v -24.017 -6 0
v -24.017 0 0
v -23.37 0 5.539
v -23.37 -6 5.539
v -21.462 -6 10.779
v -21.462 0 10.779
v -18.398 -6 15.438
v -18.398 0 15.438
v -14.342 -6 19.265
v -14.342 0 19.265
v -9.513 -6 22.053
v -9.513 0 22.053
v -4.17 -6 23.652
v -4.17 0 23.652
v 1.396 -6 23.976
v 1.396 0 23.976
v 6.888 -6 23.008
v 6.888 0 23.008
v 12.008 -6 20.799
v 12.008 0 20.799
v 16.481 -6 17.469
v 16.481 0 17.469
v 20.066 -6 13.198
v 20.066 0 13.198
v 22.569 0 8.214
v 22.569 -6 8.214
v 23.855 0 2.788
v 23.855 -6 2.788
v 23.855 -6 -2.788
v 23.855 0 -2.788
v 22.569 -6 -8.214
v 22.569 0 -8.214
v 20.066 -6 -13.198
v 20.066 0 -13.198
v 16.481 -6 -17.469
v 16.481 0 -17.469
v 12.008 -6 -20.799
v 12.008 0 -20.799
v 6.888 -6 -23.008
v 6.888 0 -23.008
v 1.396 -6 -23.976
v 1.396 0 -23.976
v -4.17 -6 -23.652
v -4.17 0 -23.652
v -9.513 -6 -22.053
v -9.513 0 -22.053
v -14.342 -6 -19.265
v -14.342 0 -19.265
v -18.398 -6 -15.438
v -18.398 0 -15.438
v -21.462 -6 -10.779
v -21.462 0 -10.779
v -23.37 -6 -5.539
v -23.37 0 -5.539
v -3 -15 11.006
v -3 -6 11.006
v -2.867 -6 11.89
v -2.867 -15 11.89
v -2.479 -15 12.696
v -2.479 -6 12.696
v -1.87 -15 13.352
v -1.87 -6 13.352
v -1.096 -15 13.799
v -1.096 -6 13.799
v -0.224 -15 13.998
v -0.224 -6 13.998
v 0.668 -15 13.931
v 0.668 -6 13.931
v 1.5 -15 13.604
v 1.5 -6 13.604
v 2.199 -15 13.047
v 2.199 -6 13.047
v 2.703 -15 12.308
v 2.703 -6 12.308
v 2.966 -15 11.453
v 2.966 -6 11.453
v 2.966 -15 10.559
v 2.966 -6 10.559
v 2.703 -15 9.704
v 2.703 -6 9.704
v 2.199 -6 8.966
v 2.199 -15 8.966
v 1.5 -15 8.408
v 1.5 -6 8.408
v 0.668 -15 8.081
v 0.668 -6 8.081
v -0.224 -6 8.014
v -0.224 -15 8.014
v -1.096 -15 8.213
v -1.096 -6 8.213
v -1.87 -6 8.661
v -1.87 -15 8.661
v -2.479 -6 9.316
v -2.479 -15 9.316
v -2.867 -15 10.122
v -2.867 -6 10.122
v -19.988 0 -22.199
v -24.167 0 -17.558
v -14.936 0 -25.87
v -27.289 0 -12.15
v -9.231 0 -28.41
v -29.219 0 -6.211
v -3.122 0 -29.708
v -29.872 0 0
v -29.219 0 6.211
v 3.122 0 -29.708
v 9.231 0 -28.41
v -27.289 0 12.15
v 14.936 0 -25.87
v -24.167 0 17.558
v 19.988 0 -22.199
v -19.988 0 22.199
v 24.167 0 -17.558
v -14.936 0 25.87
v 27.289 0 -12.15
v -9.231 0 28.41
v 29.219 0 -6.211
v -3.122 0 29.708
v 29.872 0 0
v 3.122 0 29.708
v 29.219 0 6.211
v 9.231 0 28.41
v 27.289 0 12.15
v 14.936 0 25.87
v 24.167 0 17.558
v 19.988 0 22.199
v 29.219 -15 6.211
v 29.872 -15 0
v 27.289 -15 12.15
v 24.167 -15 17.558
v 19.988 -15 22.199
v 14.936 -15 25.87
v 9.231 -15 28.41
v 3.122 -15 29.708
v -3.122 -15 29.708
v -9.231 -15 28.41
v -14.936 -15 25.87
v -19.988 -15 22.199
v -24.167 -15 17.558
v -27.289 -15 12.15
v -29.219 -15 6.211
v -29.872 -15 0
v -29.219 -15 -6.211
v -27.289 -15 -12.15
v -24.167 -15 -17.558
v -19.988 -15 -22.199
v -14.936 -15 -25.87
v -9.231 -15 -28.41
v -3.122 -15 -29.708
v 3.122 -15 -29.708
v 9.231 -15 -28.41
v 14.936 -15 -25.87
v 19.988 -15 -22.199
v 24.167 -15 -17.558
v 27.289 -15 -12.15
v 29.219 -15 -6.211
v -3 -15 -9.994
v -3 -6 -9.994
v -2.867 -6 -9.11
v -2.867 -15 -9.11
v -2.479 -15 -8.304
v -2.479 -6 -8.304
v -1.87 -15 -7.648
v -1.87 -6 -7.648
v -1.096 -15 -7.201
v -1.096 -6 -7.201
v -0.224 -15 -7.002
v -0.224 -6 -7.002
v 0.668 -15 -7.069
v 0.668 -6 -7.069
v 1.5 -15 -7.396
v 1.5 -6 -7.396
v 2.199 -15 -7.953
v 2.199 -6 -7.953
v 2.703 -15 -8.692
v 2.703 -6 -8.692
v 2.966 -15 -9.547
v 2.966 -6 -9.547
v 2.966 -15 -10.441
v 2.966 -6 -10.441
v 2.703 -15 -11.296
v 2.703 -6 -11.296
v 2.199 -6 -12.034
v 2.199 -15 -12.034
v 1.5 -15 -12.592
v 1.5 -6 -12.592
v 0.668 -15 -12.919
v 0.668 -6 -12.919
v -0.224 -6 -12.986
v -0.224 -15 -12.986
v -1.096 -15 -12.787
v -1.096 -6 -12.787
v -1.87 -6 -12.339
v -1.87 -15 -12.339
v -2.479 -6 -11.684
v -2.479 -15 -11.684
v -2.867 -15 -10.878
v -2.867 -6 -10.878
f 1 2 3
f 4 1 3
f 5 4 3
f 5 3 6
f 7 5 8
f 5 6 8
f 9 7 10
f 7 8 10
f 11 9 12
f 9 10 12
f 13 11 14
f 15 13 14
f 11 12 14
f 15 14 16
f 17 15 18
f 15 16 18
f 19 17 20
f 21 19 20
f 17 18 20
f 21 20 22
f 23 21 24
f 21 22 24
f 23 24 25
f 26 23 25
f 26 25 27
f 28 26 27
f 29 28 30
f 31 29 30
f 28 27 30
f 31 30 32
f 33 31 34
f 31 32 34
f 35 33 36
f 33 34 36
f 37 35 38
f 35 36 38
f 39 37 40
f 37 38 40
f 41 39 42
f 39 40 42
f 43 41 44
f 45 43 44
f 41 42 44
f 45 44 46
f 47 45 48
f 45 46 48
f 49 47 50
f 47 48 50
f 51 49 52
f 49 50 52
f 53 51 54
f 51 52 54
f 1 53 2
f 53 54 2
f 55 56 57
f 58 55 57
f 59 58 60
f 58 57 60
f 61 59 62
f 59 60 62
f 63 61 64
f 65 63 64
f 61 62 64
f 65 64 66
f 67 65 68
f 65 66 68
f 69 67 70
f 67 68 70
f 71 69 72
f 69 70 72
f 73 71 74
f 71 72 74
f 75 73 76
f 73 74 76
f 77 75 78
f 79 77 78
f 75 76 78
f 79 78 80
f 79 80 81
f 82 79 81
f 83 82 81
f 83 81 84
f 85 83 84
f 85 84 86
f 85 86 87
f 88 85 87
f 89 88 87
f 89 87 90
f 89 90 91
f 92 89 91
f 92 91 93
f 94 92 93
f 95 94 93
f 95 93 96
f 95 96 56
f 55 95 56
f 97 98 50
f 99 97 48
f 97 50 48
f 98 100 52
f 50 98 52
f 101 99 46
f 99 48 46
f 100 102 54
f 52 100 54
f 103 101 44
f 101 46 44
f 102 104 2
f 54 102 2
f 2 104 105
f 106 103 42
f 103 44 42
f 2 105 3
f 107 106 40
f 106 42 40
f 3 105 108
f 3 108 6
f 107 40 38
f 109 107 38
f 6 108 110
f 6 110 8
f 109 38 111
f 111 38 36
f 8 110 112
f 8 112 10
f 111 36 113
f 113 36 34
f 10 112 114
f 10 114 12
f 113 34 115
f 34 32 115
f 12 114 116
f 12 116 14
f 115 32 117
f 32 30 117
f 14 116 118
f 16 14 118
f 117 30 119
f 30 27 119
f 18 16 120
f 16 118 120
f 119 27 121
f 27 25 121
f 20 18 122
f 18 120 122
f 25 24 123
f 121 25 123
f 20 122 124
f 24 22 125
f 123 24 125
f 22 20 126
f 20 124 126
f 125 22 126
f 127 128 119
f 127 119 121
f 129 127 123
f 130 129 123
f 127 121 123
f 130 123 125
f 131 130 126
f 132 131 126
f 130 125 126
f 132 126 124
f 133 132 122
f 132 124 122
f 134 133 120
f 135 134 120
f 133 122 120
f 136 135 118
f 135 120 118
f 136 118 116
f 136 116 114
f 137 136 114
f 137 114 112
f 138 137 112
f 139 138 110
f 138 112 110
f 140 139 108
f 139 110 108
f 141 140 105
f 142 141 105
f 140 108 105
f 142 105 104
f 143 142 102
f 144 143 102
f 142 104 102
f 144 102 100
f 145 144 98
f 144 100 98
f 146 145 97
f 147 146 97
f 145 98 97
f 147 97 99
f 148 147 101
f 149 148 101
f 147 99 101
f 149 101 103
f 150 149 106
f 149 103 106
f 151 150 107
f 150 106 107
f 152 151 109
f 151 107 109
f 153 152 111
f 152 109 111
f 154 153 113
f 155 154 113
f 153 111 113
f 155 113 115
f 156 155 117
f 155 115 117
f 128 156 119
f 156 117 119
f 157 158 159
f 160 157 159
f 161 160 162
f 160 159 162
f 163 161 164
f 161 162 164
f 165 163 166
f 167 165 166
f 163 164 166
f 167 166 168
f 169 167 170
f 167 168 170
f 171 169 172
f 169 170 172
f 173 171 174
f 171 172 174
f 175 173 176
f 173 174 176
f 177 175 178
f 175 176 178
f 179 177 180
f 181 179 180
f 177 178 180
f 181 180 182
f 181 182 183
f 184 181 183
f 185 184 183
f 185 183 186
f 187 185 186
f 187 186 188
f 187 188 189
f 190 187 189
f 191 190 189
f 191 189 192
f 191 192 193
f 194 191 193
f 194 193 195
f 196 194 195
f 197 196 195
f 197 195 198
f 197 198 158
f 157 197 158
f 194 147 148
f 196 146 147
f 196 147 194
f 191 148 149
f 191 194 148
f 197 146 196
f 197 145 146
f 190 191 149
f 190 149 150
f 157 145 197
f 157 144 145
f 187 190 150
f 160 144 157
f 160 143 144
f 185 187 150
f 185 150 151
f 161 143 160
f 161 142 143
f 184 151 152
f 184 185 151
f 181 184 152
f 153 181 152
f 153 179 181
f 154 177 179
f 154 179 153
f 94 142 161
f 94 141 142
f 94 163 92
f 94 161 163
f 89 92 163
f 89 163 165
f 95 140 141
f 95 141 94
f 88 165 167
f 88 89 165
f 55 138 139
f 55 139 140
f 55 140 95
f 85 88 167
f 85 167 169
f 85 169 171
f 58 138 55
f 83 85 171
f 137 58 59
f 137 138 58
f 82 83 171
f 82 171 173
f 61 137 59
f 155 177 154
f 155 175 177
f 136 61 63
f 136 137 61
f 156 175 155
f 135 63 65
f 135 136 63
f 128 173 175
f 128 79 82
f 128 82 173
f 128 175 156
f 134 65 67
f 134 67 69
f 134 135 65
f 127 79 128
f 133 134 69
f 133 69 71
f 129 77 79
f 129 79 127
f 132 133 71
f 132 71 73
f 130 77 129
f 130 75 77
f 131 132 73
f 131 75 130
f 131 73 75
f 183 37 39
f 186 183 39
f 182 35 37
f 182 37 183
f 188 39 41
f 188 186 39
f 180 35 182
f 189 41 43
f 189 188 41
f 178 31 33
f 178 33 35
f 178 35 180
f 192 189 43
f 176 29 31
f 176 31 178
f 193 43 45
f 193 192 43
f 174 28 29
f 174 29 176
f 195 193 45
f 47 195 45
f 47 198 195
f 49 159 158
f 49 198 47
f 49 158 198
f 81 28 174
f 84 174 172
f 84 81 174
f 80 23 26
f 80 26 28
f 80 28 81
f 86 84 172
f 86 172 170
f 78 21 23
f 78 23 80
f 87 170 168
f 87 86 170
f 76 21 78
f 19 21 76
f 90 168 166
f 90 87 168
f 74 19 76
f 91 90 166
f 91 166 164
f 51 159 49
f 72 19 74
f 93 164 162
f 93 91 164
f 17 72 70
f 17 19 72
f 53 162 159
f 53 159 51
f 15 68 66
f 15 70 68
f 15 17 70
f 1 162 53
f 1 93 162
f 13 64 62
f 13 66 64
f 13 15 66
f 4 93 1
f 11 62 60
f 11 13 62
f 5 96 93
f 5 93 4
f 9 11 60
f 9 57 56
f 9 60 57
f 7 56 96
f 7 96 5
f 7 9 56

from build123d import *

# Parameters (mm, degrees)
F0_R     = 29.871853
F1_DEPTH = 15
F2_R     = 24.016909
F3_DEPTH = 6
F4_R     = 3
F5_DEPTH = 25


with BuildPart() as f1:
    # F0 (on Front) → F1 (new body)
    with BuildSketch(Plane.XZ):
        Circle(F0_R)
    extrude(amount=F1_DEPTH)

    # F2 (on face) → F3 (cut)
    with BuildSketch(Plane(origin=(0, 0, 0), x_dir=(-1, 0, 0), z_dir=(0, 1, 0))):
        Circle(F2_R)
    extrude(amount=-F3_DEPTH, mode=Mode.SUBTRACT)

    # F4 (on face) → F5 (cut)
    with BuildSketch(Plane(origin=(0, -6, 0), x_dir=(-1, 0, 0), z_dir=(0, 1, 0))):
        with Locations((0, 11.006043)):
            Circle(F4_R)
        with Locations((0, -9.993957)):
            Circle(F4_R)
    extrude(amount=-F5_DEPTH, mode=Mode.SUBTRACT)


solid = f1.part
